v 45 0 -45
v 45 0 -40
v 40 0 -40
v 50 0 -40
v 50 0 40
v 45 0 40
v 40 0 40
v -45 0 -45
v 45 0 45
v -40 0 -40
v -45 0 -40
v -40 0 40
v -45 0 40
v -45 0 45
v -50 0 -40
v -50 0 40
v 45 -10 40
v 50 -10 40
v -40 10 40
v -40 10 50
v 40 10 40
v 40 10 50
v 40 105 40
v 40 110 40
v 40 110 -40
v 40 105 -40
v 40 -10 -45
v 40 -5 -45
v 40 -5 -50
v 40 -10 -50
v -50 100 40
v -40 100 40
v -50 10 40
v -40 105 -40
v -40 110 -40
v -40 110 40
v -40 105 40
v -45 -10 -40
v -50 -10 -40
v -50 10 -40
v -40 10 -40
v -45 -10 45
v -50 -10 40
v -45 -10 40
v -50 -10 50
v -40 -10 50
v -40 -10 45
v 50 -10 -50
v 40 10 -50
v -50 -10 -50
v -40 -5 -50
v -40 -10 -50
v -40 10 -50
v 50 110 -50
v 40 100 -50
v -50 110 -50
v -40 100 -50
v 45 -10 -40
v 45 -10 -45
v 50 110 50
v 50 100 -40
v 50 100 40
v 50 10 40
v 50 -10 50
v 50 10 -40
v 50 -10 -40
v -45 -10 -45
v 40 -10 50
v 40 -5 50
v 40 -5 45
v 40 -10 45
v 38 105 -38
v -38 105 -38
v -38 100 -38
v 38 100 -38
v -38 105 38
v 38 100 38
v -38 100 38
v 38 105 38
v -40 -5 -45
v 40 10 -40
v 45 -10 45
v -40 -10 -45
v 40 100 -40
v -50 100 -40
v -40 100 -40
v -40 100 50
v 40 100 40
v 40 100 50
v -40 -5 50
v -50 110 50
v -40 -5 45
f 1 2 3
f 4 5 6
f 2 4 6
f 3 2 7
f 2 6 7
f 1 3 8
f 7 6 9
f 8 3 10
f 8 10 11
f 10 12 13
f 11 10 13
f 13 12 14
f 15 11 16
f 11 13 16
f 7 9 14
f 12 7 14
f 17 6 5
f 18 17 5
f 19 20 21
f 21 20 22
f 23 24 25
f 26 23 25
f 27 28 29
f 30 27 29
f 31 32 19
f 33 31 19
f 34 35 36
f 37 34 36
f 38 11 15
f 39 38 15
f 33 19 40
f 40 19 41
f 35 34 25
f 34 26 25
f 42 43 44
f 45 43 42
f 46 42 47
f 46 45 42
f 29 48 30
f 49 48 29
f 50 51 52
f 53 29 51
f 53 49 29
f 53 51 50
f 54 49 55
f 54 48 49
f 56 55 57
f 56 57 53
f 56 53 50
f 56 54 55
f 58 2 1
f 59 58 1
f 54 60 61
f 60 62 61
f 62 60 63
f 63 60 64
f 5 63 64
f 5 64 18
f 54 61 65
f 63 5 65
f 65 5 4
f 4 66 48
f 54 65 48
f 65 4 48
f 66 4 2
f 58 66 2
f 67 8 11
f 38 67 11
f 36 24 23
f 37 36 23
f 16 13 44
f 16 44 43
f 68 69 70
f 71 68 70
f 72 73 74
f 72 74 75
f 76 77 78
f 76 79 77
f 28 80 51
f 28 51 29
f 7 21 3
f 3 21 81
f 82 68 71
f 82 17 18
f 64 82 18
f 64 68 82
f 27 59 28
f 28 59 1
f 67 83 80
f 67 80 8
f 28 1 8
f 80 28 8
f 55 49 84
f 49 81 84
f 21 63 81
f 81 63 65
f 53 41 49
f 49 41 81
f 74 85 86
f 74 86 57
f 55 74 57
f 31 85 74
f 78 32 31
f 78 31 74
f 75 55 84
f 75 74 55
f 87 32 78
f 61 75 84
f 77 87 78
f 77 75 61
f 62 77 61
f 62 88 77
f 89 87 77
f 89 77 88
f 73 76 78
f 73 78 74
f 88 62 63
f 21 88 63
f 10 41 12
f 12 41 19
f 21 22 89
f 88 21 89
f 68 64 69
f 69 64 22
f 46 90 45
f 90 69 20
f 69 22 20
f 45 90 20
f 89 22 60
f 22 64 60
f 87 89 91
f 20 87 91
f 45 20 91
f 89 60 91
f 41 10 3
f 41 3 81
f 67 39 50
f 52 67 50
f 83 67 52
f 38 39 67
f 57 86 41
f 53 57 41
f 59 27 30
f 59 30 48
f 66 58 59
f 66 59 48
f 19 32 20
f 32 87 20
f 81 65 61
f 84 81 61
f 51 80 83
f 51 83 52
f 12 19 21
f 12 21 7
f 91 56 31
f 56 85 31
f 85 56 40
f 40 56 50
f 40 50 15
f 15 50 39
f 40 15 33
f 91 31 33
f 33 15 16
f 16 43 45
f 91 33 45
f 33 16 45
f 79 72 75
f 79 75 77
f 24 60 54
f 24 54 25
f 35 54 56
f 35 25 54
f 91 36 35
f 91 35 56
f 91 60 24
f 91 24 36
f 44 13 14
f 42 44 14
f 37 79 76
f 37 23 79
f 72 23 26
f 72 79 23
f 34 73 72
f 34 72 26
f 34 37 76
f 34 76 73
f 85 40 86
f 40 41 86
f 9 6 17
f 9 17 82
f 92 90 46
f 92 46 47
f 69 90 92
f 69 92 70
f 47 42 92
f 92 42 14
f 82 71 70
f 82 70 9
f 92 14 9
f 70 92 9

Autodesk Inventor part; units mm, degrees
ref_plane "YZ Plane" through (0, 0, 0) normal (1, 0, 0) x (0, 1, 0)
ref_plane "XZ Plane" through (0, 0, 0) normal (0, 1, 0) x (-1, 0, 0)
ref_plane "XY Plane" through (0, 0, 0) normal (0, 0, 1) x (1, 0, 0)
sketch "Sketch1" plane through (0, 0, 0) normal (0, 1, 0) x (-1, 0, 0)
  line L0 (-50, 50) -> (-50, -50)
  line L1 (-50, -50) -> (50, -50)
  line L2 (50, -50) -> (50, 50)
  line L3 (50, 50) -> (-50, 50)
  line L4 (-50, 50) -> (50, -50) construction
  line L5 (-50, -50) -> (50, 50) construction
  point P0 (0, 0)
  dimension "d0" = 100
  dimension "d1" = 100
extrude "Extrusion1" add sketch "Sketch1" along normal blind 110
sketch "Sketch2" plane through (0, 110, 0) normal (0, 1, 0) x (1, 0, 0)
  line L0 (40, -40) -> (40, 40)
  line L1 (40, 40) -> (-40, 40)
  line L2 (-40, 40) -> (-40, -40)
  line L3 (-40, -40) -> (40, -40)
  line L4 (40, -40) -> (-40, 40) construction
  line L5 (40, 40) -> (-40, -40) construction
  point P0 (0, 0)
  dimension "d4" = 80
  dimension "d5" = 80
extrude "Extrusion2" cut sketch "Sketch2" against normal blind 110
sketch "Sketch3" plane through (50, 0, 50) normal (1, 0, 0) x (0, 0, -1)
  line L0 (50, 0) -> (50, 110) construction
  line L1 (90, 110) -> (10, 110) construction
  line L2 (0, 0) -> (0, 110) construction
  line L3 (0, 110) -> (100, 0) construction
  line L4 (100, 0) -> (100, 110) construction
  line L5 (100, 0) -> (100, 110) construction
  line L6 (0, 0) -> (100, 0) construction
  line L7 (100, 110) -> (0, 0) construction
  line L8 (10, 10) -> (90, 10)
  line L9 (90, 10) -> (90, 100)
  line L10 (90, 100) -> (10, 100)
  line L11 (10, 100) -> (10, 10)
  line L12 (10, 10) -> (90, 100) construction
  line L13 (90, 10) -> (10, 100) construction
  point P0 (50, 55)
  dimension "d8" = 90
extrude "Extrusion3" cut sketch "Sketch3" against normal through all
sketch "Sketch4" plane through (-50, 0, 50) normal (0, 0, 1) x (1, 0, 0)
  line L0 (0, 0) -> (100, 0) projected
  line L1 (100, 0) -> (100, 110) projected
  line L2 (0, 110) -> (100, 110) projected
  line L3 (0, 0) -> (0, 110) projected
  line L4 (10, 10) -> (10, 0) projected
  line L5 (90, 0) -> (10, 0) projected
  line L6 (90, 10) -> (90, 0) projected
  line L7 (100, 10) -> (90, 10) projected
  line L8 (100, 100) -> (100, 10) projected
  line L9 (100, 100) -> (90, 100) projected
  line L10 (90, 110) -> (90, 100) projected
  line L11 (10, 110) -> (90, 110) projected
  line L12 (10, 110) -> (10, 100) projected
  line L13 (10, 100) -> (0, 100) projected
  line L14 (0, 10) -> (0, 100) projected
  line L15 (10, 10) -> (0, 10) projected
  line L16 (0, 110) -> (100, 0) construction
  line L17 (0, 110) -> (100, 110) construction
  line L18 (100, 110) -> (0, 0) construction
  line L19 (10, 10) -> (90, 10)
  line L20 (90, 10) -> (90, 100)
  line L21 (90, 100) -> (10, 100)
  line L22 (10, 100) -> (10, 10)
  line L23 (10, 10) -> (90, 100) construction
  line L24 (90, 10) -> (10, 100) construction
  point P0 (50, 0)
  point P1 (50, 55)
extrude "Extrusion4" cut sketch "Sketch4" against normal through all contours L22 L21 L20 L19
sketch "Sketch5" plane through (0, 0, 0) normal (0, -1, 0) x (1, 0, 0)
  line L0 (-40, 40) -> (-50, 40) projected
  line L1 (-50, 40) -> (-45, 40)
  line L2 (-45, 40) -> (-45, 45)
  line L3 (-50, 50) -> (50, 50) projected
  line L4 (-45, 45) -> (-40, 45)
  line L5 (-40, 50) -> (-40, 40) projected
  line L6 (-40, 45) -> (-40, 50)
  line L7 (-50, 40) -> (-50, 50)
  line L8 (-50, 50) -> (-40, 50)
  line L9 (-40, 50) -> (0, 50)
  line L10 (-40, 45) -> (0, 45)
  line L11 (0, 56.6181) -> (0, 31.8895) construction
  line L12 (45, 40) -> (50, 40)
  line L13 (45, 40) -> (45, 45)
  line L14 (50, 50) -> (-50, 50)
  line L15 (45, 45) -> (40, 45)
  line L16 (40, 50) -> (40, 45)
  line L17 (50, 40) -> (50, 50)
  line L18 (40, 45) -> (0, 45)
  point P0 (0, 0)
  point P1 (40, 40)
  dimension "d13" = 5
  dimension "d14" = 5
  dimension "d15" = 5
extrude "Extrusion5" add sketch "Sketch5" along normal blind 10 contours L0 L7 L3 L5 L4 L2 | L16 L3 L17 L12 L13 L15
sketch "Sketch6" plane through (0, 0, 0) normal (0, -1, 0) x (1, 0, 0)
  line L0 (-40, 45) -> (-40, 50) projected
  line L1 (-40, 45) -> (40, 45)
  line L2 (40, 45) -> (40, 50) projected
  line L3 (40, 45) -> (40, 50)
  line L4 (40, 50) -> (-40, 50)
  line L5 (-40, 50) -> (-40, 45)
  point P0 (0, 0)
extrude "Extrusion6" add sketch "Sketch6" along normal blind 5
sketch "Sketch7" plane through (0, 0, 0) normal (0, -1, 0) x (1, 0, 0)
  line L0 (50, -50) -> (-50, -50) projected
  line L1 (50, -50) -> (50, -40)
  line L2 (50, 40) -> (50, -50) projected
  line L3 (50, -40) -> (45, -40)
  line L4 (50, -40) -> (40, -40) projected
  line L5 (45, -40) -> (50, -40)
  line L6 (45, -40) -> (45, -45)
  line L7 (45, -45) -> (40, -45)
  line L8 (40, -45) -> (40, -50)
  line L9 (40, -45) -> (-40, -45)
  line L10 (-40, -40) -> (-40, -50) projected
  line L11 (-40, -50) -> (-40, -45)
  line L12 (40, -40) -> (40, -50) projected
  line L13 (-40, -50) -> (40, -50)
  line L14 (40, -50) -> (-40, -50)
  line L15 (-40, -45) -> (-45, -45)
  line L16 (-45, -45) -> (-45, -40)
  line L17 (-45, -40) -> (-50, -40)
  line L18 (-40, -50) -> (-50, -50)
  line L19 (-50, -50) -> (-50, 50) projected
  line L20 (-50, -40) -> (-50, -50)
  point P0 (0, 0)
  dimension "d20" = 10
  dimension "d21" = 5
  dimension "d22" = 5
  dimension "d23" = 5
extrude "Extrusion7" add sketch "Sketch7" along normal blind 10 contours L0 L8 L7 L6 L3 L1 | L0 L19 L17 L16 L15 L10
extrude "Extrusion8" add sketch "Sketch7" along normal blind 5 contours L0 L10 L9 L8
sketch "Sketch8" plane through (-40, 110, -40) normal (0, 0, 1) x (1, 0, 0)
  line L0 (80, -10) -> (0, -10) projected
  line L1 (0, -10) -> (0, -5)
  line L2 (0, -5) -> (80, -5)
  line L3 (80, -5) -> (80, -10)
  point P0 (40, -110)
  dimension "d28" = 5
extrude "Extrusion9" add sketch "Sketch8" along normal blind 2
sketch "Sketch9" plane through (40, 110, -40) normal (-1, 0, 0) x (0, 0, 1)
  line L0 (80, -10) -> (0, -10) projected
  line L1 (0, -10) -> (0, -5)
  line L2 (0, -5) -> (80, -5)
  line L3 (80, -100) -> (80, -10) projected
  line L4 (80, -5) -> (80, -10)
  point P0 (40, -110)
  dimension "d31" = 5
extrude "Extrusion10" add sketch "Sketch9" along normal blind 2
sketch "Sketch10" plane through (40, 110, 40) normal (0, 0, -1) x (-1, 0, 0)
  line L0 (80, -10) -> (0, -10) projected
  line L1 (0, -10) -> (0, -5)
  line L2 (0, -5) -> (80, -5)
  line L3 (80, -5) -> (80, -10)
  point P0 (40, -110)
  dimension "d34" = 5
  dimension "d35" = 80
extrude "Extrusion11" add sketch "Sketch10" along normal blind 2
sketch "Sketch11" plane through (-40, 110, 40) normal (1, 0, 0) x (0, 0, -1)
  line L0 (80, -10) -> (0, -10) projected
  line L1 (0, -10) -> (0, -5)
  line L2 (0, -5) -> (80, -5)
  line L3 (80, -5) -> (80, -10)
  point P0 (40, -110)
  dimension "d38" = 5
  dimension "d39" = 80
extrude "Extrusion12" add sketch "Sketch11" along normal blind 2
properties part number "Lifting Main Frame"
